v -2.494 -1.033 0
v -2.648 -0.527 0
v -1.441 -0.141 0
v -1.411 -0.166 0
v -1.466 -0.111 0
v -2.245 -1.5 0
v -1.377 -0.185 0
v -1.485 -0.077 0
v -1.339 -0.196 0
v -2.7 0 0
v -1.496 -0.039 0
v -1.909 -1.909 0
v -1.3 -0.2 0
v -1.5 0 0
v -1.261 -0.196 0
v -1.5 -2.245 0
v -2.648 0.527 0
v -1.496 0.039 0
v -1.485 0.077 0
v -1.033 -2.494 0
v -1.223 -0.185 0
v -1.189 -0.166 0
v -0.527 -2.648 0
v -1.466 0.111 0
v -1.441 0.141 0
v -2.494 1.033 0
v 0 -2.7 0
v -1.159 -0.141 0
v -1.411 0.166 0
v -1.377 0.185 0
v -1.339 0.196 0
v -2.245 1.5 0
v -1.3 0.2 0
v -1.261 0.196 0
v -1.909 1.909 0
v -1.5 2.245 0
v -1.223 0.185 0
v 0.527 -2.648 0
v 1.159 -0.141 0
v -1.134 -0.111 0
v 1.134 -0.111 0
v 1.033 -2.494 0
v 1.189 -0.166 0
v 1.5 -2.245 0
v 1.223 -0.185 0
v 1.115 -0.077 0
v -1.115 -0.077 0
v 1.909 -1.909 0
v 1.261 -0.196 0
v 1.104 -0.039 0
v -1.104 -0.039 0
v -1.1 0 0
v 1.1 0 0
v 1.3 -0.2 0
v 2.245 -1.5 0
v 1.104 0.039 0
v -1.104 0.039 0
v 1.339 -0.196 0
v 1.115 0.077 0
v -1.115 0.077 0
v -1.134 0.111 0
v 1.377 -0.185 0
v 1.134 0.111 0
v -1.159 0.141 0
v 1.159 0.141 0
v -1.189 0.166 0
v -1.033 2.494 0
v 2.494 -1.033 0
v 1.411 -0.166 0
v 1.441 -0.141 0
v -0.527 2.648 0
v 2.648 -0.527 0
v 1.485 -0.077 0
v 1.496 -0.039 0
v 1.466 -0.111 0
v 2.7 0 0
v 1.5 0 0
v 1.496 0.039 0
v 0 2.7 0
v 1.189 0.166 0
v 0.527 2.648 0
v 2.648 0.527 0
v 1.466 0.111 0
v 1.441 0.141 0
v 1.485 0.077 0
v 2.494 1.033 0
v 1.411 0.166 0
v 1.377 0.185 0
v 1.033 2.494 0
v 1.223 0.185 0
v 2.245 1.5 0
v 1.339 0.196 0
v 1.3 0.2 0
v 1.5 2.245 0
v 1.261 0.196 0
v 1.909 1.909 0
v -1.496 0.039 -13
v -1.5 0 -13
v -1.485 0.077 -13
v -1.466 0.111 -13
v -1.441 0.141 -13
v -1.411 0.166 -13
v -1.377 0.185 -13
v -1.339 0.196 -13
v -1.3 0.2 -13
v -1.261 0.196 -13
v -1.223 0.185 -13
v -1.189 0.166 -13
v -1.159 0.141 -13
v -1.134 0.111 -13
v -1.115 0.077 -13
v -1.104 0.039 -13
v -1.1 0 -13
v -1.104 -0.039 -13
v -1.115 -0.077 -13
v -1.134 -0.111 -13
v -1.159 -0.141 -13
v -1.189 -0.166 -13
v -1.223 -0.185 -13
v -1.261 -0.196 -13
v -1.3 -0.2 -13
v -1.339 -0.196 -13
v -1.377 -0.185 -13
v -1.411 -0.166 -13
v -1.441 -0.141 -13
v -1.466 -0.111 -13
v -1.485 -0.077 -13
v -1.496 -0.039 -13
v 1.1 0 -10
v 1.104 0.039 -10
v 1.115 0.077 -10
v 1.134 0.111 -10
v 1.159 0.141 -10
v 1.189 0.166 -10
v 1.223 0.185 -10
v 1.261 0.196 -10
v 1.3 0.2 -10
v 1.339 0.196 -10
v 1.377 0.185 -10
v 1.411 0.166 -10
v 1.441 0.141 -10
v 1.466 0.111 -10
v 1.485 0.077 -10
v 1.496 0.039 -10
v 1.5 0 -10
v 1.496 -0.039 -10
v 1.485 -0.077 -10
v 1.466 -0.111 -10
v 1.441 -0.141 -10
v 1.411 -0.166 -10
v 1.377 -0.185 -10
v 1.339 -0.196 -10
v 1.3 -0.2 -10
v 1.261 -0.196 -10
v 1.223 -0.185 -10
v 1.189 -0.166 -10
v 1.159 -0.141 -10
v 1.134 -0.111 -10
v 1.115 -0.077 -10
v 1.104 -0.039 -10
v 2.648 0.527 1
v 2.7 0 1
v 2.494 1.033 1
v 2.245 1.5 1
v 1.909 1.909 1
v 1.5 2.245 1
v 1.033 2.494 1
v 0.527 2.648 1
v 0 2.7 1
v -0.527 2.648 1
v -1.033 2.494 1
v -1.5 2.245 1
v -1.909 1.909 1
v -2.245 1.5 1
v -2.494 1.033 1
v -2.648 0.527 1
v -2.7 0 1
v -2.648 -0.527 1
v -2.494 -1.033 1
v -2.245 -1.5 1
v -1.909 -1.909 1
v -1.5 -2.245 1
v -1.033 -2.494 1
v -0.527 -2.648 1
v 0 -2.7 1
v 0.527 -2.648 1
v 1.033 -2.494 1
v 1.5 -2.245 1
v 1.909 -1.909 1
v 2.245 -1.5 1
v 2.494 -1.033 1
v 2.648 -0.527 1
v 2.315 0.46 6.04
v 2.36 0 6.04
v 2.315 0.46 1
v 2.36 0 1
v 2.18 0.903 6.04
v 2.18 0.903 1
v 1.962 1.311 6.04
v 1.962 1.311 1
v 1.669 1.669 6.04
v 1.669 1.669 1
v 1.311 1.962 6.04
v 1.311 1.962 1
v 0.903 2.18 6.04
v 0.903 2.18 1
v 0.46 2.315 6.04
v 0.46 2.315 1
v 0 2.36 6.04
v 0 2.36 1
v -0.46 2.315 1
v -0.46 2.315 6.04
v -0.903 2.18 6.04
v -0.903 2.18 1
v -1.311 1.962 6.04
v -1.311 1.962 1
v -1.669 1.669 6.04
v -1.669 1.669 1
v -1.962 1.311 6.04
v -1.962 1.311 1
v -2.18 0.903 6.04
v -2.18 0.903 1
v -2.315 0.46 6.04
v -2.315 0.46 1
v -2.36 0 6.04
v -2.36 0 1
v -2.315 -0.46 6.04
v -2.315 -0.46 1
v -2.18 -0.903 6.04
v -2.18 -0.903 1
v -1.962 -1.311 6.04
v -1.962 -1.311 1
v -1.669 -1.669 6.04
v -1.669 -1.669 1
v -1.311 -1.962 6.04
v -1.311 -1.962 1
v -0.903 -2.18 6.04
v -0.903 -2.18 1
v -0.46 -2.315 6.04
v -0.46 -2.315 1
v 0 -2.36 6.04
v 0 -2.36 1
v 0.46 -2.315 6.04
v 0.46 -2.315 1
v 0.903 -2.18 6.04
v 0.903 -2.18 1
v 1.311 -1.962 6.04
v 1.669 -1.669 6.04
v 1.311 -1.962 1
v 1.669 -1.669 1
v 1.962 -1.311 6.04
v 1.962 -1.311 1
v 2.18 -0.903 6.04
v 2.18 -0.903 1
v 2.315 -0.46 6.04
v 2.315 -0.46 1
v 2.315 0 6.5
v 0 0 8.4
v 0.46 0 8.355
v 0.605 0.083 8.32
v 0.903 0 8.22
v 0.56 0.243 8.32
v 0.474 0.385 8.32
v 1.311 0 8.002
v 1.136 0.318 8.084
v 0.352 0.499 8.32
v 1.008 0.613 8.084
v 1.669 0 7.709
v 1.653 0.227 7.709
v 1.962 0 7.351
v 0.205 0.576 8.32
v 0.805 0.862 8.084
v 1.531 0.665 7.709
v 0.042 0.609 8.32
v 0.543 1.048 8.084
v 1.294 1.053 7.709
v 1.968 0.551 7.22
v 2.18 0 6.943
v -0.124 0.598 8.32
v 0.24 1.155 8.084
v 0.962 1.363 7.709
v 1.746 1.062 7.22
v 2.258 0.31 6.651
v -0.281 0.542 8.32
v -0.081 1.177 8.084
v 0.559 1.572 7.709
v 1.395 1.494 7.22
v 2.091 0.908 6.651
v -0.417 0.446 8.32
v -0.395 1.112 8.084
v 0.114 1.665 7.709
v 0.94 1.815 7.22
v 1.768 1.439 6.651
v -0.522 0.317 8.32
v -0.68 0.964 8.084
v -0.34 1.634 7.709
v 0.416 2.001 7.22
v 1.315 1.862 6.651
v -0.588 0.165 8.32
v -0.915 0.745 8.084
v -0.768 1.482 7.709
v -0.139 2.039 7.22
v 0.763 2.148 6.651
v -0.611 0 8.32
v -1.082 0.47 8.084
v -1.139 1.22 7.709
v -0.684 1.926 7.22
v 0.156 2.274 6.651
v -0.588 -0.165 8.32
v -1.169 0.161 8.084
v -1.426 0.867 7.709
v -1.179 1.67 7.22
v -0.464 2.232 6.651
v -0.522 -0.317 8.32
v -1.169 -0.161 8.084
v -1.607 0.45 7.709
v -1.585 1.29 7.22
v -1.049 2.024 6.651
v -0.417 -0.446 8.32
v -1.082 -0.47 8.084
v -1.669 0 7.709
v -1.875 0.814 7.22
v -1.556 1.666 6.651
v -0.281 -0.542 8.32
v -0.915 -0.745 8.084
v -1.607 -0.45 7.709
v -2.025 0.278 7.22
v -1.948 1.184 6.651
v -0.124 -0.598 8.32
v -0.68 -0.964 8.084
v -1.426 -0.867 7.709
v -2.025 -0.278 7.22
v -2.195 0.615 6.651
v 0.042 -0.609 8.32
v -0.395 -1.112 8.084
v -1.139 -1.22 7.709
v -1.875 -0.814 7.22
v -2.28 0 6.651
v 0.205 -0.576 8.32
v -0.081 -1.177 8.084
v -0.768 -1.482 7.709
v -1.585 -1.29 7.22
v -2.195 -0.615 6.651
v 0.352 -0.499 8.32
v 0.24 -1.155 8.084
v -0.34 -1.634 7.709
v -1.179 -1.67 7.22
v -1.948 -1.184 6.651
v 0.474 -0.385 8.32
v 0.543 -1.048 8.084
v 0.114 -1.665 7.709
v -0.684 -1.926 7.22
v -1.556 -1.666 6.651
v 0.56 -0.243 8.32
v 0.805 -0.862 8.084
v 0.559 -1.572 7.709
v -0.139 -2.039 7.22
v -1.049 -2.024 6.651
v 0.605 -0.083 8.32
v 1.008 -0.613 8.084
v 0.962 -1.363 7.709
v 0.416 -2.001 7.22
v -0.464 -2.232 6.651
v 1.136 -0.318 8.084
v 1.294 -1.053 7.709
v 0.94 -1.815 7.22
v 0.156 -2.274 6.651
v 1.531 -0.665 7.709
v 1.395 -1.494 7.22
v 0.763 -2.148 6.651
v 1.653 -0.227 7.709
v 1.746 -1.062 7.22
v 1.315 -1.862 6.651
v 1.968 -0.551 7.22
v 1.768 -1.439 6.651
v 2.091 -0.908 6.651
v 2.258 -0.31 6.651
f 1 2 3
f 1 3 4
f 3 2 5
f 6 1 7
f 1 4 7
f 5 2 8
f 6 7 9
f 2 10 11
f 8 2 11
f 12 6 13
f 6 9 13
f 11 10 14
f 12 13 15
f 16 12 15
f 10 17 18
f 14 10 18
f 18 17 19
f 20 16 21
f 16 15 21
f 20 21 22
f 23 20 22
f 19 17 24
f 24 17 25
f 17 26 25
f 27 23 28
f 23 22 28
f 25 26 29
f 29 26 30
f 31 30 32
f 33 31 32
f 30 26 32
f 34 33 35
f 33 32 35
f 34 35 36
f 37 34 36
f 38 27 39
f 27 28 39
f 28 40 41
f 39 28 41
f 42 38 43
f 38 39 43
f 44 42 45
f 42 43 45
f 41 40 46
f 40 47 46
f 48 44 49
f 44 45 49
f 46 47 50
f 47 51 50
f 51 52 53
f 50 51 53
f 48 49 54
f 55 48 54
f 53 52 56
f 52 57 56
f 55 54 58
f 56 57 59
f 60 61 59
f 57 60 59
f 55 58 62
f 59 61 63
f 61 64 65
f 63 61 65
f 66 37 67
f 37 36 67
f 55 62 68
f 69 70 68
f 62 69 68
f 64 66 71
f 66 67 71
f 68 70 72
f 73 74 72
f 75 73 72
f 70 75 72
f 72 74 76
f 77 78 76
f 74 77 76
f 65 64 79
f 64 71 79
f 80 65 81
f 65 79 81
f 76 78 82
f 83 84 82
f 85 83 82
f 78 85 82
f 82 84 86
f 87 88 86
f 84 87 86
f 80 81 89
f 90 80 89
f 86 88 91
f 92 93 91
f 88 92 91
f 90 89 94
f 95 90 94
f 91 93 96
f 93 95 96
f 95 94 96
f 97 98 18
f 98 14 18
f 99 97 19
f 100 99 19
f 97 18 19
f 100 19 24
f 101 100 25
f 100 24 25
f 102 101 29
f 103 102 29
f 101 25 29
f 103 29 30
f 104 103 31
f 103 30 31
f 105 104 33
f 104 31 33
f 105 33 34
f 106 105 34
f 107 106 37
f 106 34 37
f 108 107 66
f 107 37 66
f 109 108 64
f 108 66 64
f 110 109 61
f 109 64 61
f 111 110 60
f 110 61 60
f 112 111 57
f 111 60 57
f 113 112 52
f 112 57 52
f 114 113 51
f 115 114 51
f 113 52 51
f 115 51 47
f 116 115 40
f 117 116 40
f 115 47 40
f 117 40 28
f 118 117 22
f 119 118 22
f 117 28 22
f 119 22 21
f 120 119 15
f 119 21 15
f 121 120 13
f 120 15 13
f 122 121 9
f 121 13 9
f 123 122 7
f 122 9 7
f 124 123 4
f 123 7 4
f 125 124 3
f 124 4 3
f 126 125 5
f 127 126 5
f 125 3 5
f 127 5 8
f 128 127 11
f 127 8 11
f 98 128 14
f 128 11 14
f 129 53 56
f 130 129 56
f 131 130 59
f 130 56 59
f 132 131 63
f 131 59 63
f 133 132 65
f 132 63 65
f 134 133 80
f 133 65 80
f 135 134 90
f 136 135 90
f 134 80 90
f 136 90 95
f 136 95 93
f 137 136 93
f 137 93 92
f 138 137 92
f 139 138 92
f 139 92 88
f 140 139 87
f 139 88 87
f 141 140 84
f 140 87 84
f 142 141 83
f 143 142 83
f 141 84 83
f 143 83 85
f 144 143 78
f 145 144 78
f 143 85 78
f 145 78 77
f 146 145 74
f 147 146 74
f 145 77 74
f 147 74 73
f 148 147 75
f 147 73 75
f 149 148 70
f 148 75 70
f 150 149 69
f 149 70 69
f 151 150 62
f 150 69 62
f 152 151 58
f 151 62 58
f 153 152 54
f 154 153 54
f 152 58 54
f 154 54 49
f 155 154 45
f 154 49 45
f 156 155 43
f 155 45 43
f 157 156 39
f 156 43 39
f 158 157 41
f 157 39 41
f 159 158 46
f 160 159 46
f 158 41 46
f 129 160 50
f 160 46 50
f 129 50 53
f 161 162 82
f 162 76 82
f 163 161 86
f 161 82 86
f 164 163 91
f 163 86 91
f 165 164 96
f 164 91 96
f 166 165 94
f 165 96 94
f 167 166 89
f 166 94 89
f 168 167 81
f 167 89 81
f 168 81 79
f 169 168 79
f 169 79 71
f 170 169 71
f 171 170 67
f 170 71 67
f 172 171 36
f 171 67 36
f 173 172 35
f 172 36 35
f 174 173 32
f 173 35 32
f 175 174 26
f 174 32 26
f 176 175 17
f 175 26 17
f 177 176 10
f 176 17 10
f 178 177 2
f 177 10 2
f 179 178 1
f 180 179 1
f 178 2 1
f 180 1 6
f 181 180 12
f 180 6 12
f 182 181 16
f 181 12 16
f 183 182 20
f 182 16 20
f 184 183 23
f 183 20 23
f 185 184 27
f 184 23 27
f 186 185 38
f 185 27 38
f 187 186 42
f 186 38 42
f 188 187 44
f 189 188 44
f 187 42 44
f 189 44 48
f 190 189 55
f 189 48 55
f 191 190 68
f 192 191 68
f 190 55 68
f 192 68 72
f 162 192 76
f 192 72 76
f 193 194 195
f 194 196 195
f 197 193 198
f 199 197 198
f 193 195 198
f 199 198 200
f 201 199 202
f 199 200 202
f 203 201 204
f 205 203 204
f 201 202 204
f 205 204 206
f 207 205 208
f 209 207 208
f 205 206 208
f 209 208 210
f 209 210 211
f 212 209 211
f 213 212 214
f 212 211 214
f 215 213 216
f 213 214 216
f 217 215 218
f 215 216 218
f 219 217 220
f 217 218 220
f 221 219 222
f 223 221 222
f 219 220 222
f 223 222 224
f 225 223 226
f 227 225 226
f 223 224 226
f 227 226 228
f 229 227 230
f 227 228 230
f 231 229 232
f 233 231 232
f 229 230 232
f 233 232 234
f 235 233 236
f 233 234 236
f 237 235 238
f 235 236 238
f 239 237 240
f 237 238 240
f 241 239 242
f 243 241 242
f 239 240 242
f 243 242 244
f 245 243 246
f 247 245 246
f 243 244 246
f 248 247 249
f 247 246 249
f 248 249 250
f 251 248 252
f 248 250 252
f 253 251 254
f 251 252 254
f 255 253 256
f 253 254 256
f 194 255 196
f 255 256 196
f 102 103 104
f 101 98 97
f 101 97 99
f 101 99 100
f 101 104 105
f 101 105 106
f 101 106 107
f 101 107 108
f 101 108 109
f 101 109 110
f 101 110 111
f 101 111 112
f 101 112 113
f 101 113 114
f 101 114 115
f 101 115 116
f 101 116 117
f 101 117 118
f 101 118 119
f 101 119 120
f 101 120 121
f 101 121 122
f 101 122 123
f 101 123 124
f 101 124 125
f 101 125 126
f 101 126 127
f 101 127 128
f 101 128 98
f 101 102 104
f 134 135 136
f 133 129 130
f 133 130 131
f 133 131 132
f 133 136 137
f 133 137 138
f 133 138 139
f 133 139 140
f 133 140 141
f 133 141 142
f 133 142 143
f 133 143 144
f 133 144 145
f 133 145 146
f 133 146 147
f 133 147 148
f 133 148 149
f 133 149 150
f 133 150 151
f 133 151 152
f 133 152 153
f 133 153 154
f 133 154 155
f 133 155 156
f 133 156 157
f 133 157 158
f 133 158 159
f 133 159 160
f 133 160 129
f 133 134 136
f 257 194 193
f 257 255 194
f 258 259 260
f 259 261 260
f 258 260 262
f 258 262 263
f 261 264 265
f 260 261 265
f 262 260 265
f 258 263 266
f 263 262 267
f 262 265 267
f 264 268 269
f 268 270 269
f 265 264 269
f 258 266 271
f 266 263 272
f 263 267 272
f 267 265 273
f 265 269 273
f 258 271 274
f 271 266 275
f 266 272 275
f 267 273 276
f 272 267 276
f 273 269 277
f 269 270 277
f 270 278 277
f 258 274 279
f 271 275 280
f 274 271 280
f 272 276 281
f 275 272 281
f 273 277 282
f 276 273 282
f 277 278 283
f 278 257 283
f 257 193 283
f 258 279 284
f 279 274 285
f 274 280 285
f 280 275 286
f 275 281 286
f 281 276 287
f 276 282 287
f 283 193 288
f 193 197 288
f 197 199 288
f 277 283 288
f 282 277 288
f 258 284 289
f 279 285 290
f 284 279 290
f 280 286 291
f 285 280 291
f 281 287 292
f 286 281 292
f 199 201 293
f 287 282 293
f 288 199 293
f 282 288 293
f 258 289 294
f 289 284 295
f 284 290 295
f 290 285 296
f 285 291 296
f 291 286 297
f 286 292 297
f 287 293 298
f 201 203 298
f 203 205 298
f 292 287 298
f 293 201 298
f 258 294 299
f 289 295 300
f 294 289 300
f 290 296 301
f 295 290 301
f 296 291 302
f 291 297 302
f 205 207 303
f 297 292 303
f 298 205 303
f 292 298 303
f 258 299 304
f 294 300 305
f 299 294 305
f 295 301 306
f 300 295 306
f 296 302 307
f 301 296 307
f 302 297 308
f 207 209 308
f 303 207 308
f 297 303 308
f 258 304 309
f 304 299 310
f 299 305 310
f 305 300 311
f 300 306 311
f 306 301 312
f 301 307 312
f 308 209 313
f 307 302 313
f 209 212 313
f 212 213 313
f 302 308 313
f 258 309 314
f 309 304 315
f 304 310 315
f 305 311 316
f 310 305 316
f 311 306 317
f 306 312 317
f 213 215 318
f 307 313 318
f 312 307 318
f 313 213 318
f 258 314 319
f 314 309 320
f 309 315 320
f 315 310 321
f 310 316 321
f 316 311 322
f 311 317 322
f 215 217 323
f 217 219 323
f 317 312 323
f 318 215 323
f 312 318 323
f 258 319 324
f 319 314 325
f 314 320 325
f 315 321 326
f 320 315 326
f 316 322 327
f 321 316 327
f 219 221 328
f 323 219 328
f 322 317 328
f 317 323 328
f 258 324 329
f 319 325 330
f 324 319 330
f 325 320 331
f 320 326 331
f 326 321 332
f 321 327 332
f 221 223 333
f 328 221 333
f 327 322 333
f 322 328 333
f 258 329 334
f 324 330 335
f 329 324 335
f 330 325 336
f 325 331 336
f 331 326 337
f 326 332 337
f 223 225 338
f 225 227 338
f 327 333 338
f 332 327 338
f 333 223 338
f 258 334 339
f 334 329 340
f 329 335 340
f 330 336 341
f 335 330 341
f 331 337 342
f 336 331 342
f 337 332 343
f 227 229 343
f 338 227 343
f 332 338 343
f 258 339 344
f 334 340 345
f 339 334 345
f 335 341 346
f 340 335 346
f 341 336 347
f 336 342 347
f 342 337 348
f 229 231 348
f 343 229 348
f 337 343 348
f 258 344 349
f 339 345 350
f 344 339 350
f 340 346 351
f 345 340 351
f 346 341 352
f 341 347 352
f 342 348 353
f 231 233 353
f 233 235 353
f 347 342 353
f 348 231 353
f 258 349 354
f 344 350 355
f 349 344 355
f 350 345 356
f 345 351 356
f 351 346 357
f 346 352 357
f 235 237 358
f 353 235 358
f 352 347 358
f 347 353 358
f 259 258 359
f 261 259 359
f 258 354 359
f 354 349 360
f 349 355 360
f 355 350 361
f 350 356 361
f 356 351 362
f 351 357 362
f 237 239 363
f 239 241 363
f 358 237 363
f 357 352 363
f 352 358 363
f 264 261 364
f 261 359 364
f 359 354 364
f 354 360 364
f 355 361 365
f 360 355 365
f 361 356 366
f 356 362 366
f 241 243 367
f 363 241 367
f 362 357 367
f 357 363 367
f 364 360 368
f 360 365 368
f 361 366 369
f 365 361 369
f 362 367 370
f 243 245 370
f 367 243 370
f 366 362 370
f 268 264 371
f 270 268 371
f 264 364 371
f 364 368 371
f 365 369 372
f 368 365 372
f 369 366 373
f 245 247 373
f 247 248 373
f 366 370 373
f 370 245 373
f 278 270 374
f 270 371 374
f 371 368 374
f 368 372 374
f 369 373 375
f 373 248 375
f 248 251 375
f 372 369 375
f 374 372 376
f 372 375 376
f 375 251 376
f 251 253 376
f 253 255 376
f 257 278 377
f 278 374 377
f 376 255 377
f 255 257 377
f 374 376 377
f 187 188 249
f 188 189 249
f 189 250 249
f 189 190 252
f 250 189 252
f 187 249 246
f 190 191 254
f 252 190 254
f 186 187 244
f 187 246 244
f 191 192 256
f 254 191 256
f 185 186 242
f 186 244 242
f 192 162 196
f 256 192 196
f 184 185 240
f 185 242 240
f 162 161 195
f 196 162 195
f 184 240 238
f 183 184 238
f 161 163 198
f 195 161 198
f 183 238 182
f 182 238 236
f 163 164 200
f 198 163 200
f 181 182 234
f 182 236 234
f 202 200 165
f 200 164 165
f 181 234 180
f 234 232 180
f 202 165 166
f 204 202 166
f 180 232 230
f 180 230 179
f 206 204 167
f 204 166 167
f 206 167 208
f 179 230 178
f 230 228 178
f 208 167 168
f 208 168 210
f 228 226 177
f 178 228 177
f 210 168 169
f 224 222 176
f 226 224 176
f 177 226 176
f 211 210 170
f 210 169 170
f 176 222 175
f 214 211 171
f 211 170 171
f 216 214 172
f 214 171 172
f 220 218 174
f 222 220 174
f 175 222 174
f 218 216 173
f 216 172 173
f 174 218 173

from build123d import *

# Parameters (mm, degrees)
SKETCH_3_R      = 0.2
EXTRUDE_1_DEPTH = 10
SKETCH_4_R      = 0.2
EXTRUDE_2_DEPTH = 3


with BuildPart() as part:
    # 草图2 → 旋转1 (revolve)
    with BuildSketch(Plane(origin=(0, 0, 0), x_dir=(1, 0, 0), z_dir=(0, 1, 0))):
        with BuildLine():
            Line((2.36, -6.04), (2.36, -1))
            Line((2.36, -1), (2.7, -1))
            Line((2.7, -1), (2.7, 0))
            Line((2.7, 0), (0, 0))
            Line((0, 0), (0, -8.4))
            ThreePointArc((0, -8.4), (1.668772004, -7.708772004), (2.36, -6.04))
        make_face()
    revolve(axis=Axis((0, 0, 0), (0, 0, 1)))

    # 草图3 → 凸台-拉伸1 (add)
    with BuildSketch(Plane(origin=(0, 0, 0), x_dir=(-1, 0, 0), z_dir=(0, 0, -1))):
        with Locations((1.3, 0)):
            Circle(SKETCH_3_R)
        with Locations((-1.3, 0)):
            Circle(SKETCH_3_R)
    extrude(amount=EXTRUDE_1_DEPTH)

    # 草图4 → 凸台-拉伸2 (add)
    with BuildSketch(Plane(origin=(0, 0, -10), x_dir=(-1, 0, 0), z_dir=(0, 0, -1))):
        with Locations((1.3, 0)):
            Circle(SKETCH_4_R)
    extrude(amount=EXTRUDE_2_DEPTH)


solid = part.part
